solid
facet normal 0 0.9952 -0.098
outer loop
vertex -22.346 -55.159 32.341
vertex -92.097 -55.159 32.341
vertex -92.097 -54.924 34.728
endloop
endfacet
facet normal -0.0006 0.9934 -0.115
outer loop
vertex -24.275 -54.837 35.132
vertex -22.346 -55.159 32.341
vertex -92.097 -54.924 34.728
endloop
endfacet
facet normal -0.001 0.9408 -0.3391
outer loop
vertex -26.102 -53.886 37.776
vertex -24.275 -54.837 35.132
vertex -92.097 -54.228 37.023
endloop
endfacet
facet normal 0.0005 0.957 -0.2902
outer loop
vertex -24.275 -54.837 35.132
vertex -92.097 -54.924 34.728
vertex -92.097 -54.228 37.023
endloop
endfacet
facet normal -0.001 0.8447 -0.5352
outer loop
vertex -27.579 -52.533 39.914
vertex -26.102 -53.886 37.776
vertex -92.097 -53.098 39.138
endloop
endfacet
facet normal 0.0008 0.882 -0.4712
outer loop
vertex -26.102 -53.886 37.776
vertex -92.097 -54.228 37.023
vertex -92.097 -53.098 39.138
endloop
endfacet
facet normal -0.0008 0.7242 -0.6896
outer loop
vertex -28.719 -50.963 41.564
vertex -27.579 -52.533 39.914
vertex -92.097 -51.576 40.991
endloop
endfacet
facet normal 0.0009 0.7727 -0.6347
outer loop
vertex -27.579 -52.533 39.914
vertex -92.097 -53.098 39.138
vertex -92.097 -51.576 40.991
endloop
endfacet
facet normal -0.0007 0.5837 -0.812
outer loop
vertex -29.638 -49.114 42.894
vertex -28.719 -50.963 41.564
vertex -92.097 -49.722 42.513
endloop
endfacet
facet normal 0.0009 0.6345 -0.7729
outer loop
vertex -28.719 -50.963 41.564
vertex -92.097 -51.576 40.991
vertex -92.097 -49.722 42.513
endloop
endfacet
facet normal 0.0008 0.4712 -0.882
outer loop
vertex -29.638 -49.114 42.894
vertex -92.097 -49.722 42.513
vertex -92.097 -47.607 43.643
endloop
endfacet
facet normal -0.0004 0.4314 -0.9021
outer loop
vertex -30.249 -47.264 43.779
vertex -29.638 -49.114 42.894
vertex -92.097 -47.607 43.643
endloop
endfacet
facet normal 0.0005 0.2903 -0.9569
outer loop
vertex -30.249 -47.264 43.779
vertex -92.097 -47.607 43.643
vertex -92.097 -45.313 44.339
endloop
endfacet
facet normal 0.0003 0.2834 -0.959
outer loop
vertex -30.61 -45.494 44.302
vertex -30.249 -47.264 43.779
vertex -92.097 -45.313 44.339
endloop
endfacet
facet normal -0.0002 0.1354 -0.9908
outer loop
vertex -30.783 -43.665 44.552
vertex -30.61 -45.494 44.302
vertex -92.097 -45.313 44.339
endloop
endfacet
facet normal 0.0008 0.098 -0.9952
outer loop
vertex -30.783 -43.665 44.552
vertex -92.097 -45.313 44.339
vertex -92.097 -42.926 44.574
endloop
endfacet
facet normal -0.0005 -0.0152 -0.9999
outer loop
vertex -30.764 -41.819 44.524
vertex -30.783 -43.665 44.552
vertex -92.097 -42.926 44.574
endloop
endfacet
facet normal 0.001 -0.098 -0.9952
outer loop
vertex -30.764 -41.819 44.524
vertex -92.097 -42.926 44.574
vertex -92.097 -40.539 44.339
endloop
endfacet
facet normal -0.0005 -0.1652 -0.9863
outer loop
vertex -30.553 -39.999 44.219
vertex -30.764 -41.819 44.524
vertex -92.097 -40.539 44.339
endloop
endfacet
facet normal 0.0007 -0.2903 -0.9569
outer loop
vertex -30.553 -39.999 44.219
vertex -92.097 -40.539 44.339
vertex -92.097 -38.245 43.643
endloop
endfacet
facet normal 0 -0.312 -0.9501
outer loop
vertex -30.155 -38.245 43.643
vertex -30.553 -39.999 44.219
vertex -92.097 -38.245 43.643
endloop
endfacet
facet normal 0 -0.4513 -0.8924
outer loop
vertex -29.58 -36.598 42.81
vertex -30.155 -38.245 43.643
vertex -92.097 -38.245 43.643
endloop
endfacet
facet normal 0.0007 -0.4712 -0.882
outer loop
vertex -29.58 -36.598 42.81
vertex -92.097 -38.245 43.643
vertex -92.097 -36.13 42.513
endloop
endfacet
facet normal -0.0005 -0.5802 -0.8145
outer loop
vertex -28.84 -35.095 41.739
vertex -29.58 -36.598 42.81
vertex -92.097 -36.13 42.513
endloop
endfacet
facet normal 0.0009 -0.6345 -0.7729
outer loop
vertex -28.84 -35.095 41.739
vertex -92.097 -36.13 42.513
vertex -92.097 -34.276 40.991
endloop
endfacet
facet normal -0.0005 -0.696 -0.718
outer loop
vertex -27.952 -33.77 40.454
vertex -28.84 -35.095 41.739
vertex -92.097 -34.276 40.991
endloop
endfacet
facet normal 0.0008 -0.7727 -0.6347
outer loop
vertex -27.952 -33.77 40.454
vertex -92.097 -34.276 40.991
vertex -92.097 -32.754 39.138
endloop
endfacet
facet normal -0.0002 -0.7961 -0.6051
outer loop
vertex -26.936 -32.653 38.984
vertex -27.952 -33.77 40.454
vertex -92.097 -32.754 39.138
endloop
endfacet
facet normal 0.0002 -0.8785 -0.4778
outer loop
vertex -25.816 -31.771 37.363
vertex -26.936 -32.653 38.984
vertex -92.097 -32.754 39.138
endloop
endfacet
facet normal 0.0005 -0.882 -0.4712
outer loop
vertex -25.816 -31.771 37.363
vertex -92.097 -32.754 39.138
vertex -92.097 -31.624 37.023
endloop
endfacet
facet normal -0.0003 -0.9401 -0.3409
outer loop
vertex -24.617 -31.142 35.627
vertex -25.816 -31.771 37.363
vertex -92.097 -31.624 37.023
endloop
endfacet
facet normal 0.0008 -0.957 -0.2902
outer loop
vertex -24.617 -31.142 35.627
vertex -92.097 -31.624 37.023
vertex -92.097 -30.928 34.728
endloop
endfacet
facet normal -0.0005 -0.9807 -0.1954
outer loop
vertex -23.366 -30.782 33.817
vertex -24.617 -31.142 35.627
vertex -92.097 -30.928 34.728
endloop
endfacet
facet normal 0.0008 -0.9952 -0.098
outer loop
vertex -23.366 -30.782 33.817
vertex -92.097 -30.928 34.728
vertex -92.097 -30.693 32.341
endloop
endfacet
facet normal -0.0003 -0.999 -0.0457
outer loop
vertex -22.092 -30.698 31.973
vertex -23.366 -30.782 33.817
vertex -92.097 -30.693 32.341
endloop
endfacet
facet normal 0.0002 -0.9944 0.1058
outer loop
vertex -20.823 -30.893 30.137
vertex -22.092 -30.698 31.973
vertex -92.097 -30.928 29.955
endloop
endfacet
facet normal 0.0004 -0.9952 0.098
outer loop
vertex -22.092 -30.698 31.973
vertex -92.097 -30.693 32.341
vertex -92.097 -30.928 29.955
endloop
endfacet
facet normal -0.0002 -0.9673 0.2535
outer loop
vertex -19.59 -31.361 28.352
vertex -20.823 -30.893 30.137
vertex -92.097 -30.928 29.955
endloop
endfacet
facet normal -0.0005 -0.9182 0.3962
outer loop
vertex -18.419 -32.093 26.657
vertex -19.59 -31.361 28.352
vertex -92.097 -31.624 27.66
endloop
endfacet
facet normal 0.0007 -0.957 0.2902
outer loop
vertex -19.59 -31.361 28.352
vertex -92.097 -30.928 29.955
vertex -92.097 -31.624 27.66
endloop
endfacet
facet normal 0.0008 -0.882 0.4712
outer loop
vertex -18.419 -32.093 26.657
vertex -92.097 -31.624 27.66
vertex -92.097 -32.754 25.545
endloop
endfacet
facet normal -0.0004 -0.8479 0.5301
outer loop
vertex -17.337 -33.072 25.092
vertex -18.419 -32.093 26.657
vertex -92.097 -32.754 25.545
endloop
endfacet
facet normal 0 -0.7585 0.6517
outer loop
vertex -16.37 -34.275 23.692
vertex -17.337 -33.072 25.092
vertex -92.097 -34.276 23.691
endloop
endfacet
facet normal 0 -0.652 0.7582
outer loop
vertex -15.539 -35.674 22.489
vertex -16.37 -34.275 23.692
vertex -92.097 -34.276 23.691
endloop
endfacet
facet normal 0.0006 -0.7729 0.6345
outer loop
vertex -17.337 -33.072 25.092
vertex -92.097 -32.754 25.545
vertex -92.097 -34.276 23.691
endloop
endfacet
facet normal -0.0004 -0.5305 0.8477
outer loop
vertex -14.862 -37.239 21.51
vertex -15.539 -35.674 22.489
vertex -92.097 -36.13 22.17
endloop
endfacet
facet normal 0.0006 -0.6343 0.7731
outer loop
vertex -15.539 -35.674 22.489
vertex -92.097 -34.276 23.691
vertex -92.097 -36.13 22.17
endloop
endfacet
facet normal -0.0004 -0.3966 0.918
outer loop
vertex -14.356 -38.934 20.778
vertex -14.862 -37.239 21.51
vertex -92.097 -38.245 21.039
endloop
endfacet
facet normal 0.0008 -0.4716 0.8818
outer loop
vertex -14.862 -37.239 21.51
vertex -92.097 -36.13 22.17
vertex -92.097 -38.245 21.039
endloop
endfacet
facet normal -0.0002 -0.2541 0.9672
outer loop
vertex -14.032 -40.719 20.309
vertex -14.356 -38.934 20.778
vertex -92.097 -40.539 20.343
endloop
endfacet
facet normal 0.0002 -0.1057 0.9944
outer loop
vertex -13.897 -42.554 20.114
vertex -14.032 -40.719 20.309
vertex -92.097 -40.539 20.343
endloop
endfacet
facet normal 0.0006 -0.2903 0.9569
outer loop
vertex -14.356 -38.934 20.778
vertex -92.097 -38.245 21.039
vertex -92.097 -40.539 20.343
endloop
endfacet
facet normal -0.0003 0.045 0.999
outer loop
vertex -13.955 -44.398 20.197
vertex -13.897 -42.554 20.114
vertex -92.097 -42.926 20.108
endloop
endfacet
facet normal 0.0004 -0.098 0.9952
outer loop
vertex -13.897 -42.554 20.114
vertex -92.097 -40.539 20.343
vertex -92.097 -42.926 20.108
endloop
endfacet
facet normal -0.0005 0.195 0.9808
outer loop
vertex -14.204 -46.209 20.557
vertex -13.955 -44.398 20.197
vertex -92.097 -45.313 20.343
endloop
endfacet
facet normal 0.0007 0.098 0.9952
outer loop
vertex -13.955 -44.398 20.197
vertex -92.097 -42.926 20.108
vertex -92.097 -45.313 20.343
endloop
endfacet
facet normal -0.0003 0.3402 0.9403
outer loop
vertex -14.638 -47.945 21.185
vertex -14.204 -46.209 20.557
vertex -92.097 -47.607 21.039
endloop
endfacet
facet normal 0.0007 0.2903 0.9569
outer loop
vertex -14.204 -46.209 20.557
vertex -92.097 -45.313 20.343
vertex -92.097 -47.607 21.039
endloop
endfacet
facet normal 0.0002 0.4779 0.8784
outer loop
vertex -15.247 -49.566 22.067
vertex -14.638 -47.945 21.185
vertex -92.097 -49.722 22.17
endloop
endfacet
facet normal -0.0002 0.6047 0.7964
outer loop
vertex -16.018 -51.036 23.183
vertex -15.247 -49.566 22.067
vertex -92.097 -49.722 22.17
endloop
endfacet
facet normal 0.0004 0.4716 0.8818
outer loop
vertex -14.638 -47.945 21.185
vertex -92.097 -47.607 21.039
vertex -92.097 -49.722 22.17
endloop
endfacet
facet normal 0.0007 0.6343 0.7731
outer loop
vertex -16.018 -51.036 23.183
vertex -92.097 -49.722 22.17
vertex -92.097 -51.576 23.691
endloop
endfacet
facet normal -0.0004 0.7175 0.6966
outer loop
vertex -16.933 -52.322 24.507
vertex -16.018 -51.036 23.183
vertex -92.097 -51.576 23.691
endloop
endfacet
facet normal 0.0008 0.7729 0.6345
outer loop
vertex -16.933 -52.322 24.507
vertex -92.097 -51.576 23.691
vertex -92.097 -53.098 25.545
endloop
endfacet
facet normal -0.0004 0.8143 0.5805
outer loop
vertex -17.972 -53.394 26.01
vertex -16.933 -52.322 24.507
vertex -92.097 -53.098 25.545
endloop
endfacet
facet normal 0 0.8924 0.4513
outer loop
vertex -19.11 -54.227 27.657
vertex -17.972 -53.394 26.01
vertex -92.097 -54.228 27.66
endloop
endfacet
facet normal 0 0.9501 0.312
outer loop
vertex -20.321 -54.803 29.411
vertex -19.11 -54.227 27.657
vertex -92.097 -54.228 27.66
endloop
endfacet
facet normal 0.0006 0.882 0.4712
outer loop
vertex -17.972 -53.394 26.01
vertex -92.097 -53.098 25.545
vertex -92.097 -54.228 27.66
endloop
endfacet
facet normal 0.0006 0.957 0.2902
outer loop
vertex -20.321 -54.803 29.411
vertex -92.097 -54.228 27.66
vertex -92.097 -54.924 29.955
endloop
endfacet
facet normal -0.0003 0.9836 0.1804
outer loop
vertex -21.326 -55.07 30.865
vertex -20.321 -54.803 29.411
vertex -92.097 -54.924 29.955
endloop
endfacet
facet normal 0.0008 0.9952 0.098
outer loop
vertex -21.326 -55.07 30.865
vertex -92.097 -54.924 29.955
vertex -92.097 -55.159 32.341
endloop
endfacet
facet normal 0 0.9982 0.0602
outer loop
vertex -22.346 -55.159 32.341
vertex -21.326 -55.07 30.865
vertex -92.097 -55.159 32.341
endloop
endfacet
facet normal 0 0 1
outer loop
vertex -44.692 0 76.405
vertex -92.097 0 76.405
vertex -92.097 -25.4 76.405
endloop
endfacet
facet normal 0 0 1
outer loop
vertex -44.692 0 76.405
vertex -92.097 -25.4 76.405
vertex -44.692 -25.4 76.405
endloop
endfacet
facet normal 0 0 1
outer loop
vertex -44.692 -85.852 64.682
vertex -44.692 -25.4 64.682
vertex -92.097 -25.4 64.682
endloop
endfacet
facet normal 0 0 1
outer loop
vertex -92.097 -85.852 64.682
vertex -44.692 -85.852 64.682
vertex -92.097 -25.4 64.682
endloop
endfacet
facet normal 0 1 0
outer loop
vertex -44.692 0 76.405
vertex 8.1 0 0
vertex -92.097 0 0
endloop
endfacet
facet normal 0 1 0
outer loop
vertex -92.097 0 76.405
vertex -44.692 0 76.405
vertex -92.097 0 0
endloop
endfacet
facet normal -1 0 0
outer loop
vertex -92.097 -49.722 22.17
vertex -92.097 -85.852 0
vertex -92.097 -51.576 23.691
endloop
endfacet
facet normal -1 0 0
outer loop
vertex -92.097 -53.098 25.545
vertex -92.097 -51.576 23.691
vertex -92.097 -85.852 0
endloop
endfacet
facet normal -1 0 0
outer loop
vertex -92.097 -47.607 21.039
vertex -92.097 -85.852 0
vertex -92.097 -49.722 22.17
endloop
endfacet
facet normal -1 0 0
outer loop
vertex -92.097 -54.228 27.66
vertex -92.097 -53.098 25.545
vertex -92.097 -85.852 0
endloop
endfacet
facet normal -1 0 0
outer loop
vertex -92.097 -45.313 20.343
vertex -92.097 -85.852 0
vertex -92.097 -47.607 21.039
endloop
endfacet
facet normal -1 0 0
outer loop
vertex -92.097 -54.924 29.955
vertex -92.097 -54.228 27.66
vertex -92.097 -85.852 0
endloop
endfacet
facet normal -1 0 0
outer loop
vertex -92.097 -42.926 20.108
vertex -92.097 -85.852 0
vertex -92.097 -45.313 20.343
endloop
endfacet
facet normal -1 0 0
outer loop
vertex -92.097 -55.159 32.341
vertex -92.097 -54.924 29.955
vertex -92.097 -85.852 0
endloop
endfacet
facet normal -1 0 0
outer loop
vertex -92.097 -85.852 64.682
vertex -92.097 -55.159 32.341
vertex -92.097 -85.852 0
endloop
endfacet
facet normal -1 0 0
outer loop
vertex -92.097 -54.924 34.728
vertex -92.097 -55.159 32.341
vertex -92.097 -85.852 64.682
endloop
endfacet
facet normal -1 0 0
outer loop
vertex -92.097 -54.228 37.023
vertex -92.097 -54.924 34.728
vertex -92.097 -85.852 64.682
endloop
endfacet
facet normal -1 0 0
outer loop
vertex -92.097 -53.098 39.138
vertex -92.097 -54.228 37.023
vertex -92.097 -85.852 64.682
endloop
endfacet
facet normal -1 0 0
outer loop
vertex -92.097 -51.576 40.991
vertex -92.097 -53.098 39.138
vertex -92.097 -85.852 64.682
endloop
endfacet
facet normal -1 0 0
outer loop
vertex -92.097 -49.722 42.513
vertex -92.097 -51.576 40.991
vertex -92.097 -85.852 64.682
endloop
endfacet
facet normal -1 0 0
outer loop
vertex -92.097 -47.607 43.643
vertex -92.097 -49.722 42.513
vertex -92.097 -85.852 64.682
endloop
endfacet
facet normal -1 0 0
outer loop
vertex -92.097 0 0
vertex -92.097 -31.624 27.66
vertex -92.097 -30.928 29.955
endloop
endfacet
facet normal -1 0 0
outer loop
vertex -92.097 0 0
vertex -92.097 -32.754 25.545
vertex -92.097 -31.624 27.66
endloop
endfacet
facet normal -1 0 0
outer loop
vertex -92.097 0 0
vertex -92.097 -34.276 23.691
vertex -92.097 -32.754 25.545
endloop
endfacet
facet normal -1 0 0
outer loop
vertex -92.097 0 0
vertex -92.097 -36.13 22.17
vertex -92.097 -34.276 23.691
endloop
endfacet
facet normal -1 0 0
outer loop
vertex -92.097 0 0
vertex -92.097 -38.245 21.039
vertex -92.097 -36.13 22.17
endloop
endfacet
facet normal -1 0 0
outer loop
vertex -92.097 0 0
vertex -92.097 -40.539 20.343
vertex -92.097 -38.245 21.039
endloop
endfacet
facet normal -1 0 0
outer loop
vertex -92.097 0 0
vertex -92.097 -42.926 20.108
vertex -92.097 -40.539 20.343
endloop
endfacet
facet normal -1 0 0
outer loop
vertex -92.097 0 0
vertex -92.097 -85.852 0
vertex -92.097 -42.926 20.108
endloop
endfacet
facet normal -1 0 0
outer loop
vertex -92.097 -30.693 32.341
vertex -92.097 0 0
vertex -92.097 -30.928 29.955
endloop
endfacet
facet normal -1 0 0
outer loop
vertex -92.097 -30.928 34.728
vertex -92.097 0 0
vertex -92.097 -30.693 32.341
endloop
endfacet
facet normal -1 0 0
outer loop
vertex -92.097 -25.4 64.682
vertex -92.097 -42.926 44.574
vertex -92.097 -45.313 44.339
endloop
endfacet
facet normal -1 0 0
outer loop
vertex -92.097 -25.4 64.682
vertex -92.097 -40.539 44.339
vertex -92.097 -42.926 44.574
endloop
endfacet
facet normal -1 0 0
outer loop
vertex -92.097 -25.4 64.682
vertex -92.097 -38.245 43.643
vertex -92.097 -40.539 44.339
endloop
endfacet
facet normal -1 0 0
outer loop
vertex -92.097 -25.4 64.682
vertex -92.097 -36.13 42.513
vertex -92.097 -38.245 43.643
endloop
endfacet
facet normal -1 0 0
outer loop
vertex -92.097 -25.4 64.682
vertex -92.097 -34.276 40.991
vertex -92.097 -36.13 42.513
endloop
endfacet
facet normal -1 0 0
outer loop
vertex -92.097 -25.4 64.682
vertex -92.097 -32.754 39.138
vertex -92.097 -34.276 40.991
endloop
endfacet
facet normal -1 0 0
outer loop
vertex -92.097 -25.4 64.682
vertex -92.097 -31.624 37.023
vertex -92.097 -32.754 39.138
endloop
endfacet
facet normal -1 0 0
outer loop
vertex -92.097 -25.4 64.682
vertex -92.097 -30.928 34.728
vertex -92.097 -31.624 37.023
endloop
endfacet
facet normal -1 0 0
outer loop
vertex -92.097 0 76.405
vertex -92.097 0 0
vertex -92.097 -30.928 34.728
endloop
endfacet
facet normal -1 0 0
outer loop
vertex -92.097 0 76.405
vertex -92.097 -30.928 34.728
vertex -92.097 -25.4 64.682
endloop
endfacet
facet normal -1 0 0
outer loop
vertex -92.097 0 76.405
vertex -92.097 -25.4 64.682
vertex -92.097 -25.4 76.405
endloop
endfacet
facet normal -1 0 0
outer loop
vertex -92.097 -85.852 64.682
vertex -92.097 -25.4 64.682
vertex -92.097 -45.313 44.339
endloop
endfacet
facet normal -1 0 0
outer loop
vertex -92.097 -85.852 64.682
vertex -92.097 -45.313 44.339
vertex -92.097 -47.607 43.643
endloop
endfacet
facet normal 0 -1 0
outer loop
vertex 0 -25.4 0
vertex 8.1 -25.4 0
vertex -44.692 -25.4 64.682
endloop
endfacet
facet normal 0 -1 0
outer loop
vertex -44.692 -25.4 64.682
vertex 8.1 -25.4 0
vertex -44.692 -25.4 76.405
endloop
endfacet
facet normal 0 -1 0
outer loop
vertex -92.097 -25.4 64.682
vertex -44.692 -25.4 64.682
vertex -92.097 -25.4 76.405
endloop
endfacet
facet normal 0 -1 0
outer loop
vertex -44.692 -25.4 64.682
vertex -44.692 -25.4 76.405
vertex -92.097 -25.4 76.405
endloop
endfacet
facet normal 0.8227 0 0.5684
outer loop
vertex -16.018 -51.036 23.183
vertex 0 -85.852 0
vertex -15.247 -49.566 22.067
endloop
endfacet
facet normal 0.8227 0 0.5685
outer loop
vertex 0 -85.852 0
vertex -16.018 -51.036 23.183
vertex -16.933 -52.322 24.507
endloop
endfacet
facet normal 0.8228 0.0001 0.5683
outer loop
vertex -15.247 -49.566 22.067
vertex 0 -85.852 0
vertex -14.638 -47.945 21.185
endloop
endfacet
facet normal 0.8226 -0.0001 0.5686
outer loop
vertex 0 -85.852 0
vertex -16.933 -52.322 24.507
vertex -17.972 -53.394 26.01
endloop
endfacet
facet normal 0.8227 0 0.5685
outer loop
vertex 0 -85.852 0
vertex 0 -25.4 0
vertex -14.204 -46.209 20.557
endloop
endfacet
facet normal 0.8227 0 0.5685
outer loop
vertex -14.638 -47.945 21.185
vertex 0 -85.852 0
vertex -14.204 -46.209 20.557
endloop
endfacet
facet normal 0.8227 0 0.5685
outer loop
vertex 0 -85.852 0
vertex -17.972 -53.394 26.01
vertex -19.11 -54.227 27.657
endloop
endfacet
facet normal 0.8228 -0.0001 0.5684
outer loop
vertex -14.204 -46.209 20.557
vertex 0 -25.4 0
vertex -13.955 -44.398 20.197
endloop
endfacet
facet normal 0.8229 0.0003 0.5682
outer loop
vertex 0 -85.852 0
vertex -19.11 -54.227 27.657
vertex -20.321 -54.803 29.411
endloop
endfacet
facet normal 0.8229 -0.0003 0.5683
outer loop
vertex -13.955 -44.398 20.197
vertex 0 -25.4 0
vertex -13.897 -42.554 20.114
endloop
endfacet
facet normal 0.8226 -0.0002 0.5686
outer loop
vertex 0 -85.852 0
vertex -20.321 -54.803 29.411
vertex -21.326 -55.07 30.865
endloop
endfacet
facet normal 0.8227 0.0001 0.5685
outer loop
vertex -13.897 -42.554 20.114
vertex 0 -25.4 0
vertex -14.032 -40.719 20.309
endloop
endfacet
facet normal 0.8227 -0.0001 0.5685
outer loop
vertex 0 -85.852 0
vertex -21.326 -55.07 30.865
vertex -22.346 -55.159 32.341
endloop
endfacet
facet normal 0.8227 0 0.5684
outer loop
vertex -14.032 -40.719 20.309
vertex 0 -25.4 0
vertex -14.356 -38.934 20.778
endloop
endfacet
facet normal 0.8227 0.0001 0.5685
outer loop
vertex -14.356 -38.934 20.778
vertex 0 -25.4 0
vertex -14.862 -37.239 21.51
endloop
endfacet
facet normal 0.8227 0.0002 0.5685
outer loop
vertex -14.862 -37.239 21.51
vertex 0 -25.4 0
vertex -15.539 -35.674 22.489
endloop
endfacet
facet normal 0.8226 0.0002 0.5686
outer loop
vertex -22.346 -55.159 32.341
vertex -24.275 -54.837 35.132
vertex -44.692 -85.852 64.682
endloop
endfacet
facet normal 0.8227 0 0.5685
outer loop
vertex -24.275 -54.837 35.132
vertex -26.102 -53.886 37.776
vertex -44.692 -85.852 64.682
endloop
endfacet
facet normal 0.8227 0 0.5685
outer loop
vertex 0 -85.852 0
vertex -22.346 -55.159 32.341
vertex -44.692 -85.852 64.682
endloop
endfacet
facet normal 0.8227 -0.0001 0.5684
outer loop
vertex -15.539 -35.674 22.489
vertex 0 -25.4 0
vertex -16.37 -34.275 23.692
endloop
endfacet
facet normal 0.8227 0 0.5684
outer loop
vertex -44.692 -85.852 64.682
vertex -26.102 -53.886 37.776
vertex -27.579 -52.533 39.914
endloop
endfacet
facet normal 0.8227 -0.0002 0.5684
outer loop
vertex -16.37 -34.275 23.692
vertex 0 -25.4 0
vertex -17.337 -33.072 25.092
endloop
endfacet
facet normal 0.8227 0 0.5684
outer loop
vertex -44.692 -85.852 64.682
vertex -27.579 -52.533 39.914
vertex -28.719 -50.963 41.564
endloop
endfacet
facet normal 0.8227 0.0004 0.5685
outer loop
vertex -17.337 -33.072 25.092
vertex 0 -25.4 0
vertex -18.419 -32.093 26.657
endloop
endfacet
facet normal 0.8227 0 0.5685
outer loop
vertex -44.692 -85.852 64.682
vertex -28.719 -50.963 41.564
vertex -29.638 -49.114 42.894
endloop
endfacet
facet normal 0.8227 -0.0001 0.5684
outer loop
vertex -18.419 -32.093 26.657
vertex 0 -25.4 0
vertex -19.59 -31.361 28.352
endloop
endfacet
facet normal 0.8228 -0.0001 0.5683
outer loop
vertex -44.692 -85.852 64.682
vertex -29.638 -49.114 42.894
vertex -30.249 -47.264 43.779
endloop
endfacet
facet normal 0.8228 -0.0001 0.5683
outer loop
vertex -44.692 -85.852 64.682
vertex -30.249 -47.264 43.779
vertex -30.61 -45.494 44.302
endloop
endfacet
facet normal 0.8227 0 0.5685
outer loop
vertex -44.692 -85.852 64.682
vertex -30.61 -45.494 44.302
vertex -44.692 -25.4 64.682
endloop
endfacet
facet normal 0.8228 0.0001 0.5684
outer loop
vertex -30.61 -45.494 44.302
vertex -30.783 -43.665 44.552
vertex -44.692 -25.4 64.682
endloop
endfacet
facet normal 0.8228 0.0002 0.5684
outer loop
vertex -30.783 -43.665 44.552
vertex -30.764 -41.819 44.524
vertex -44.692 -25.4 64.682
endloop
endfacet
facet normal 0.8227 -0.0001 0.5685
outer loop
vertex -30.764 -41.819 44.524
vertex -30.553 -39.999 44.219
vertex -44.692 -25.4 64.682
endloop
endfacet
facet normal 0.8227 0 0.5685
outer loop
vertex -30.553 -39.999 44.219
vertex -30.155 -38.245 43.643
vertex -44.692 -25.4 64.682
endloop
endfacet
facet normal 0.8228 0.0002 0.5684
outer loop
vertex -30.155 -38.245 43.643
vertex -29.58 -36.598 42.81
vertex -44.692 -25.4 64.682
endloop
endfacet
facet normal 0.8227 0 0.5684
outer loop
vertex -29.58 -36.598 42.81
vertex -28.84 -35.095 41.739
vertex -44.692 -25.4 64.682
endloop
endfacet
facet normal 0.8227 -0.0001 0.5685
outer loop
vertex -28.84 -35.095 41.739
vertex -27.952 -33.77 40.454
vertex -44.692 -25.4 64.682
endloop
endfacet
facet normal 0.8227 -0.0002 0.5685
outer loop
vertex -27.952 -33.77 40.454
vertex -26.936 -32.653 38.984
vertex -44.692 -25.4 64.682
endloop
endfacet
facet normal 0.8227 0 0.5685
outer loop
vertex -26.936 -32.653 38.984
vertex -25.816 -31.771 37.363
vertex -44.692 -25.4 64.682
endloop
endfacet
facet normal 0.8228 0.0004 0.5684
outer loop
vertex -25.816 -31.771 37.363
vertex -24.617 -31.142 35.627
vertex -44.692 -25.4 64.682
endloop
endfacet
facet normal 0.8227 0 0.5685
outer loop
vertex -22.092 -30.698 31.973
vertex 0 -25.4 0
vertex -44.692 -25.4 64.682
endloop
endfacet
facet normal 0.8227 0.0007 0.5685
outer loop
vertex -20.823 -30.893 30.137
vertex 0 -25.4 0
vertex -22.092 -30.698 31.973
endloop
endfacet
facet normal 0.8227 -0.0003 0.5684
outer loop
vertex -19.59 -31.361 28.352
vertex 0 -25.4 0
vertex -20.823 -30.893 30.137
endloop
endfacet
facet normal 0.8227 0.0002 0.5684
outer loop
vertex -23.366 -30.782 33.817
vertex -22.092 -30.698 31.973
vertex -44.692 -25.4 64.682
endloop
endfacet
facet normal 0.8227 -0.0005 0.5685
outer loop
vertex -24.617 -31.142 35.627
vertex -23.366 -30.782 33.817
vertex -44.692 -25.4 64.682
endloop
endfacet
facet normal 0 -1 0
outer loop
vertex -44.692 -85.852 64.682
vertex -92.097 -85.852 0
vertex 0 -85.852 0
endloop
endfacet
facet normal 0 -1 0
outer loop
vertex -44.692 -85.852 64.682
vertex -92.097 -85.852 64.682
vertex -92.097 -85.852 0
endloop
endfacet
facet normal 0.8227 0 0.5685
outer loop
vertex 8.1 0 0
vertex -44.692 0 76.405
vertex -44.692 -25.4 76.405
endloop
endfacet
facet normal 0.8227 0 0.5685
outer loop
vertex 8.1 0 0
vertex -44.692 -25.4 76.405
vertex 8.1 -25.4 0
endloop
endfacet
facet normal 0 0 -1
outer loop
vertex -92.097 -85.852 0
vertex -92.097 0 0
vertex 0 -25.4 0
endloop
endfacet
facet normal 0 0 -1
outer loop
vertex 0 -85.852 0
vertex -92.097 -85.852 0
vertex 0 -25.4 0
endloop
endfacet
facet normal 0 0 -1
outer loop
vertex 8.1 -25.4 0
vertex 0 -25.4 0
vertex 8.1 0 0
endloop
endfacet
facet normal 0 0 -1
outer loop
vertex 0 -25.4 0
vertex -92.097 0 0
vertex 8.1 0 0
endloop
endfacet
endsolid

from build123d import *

# Parameters (mm, degrees)
F1_DEPTH = 85.852
F3_DEPTH = 25.4
F4_R     = 12.233243
F5_DEPTH = 100.197954


with BuildPart() as f1:
    # F0 (on Front) → F1 (new body)
    with BuildSketch(Plane.XZ):
        Polygon((-92.0972, 0), (0, 0), (-44.692129, 64.682215), (-92.0972, 64.682215), align=None)
    extrude(amount=F1_DEPTH)

    # F2 (on face) → F3 (join)
    with BuildSketch(Plane(origin=(0, 0, 0), x_dir=(-1, 0, 0), z_dir=(0, 1, 0))):
        Polygon((44.692129, 64.682215), (92.0972, 64.682215), (92.0972, 76.404862), (44.692129, 76.404862), (-8.099754, 0), (0, 0), align=None)
    extrude(amount=-F3_DEPTH)

    # F4 (on face) → F5 (cut, through all)
    with BuildSketch(Plane(origin=(-92.0972, 0, 0), x_dir=(0, -1, 0), z_dir=(-1, 0, 0))):
        with Locations((42.926, 32.341108)):
            Circle(F4_R)
    extrude(amount=-F5_DEPTH, mode=Mode.SUBTRACT)


solid = f1.part
